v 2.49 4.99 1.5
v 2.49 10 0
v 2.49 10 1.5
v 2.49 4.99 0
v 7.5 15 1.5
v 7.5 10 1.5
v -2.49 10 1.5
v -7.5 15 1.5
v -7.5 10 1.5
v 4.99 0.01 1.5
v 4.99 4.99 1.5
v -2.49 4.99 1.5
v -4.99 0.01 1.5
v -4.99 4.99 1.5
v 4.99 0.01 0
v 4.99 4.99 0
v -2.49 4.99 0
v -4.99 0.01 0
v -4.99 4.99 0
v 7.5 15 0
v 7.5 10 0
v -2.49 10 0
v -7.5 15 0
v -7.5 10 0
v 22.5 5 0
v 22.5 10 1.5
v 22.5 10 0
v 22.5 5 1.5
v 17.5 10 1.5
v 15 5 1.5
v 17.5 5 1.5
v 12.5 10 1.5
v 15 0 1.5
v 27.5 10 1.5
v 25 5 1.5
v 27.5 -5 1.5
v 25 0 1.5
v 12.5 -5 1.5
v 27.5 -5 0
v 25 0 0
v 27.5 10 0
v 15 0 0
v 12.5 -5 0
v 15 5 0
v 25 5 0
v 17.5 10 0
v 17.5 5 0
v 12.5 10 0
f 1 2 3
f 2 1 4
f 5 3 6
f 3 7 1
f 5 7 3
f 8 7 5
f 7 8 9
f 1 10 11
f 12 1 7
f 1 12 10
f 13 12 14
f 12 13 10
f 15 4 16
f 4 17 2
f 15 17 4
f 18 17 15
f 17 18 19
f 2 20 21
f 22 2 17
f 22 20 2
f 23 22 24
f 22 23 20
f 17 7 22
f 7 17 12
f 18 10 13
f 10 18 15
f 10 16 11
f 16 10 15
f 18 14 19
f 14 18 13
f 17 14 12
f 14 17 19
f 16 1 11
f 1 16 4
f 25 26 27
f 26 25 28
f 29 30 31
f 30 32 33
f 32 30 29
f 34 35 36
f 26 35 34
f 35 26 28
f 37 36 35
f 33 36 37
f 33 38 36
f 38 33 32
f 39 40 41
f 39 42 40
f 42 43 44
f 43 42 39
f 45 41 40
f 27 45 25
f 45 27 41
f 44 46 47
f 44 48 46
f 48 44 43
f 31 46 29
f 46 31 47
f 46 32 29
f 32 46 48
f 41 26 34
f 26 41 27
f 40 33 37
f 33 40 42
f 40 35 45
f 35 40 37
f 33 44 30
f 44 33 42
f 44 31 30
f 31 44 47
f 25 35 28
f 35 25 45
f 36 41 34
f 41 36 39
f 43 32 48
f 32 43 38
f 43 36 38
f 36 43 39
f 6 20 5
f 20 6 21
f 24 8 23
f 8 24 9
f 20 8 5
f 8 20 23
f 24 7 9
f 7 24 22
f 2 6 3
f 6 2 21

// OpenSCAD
$fn = 100;

bottomThickness = 1.5;
wallThickness = 1.5;


hookWidth = 10;
hookDepth = 10;
hookSize = 5;

translate([-(hookWidth + 5) / 2, 10, 0])
cube([hookWidth + 5, 5, bottomThickness]);
hook(hookWidth, hookDepth + 1, hookSize);


translate([20, 0, 0])
hookHolder(hookWidth, hookDepth, hookSize);





module hookHolder(width, depth, size) {
    difference() {
        translate([-(width + 5) / 2, -5, 0])
        cube([width + 5, depth + 5, bottomThickness]);
        hook(width, depth, size, 0);
    }
}
module hook(width, depth, size, margin = 0.01) {
    translate([-size/2 + margin, margin, 0])
    cube([size - margin * 2, depth - margin * 2, bottomThickness]);
    translate([-width/2 + margin, margin, 0])
    cube([width - margin * 2, size - margin * 2, bottomThickness]);
}
